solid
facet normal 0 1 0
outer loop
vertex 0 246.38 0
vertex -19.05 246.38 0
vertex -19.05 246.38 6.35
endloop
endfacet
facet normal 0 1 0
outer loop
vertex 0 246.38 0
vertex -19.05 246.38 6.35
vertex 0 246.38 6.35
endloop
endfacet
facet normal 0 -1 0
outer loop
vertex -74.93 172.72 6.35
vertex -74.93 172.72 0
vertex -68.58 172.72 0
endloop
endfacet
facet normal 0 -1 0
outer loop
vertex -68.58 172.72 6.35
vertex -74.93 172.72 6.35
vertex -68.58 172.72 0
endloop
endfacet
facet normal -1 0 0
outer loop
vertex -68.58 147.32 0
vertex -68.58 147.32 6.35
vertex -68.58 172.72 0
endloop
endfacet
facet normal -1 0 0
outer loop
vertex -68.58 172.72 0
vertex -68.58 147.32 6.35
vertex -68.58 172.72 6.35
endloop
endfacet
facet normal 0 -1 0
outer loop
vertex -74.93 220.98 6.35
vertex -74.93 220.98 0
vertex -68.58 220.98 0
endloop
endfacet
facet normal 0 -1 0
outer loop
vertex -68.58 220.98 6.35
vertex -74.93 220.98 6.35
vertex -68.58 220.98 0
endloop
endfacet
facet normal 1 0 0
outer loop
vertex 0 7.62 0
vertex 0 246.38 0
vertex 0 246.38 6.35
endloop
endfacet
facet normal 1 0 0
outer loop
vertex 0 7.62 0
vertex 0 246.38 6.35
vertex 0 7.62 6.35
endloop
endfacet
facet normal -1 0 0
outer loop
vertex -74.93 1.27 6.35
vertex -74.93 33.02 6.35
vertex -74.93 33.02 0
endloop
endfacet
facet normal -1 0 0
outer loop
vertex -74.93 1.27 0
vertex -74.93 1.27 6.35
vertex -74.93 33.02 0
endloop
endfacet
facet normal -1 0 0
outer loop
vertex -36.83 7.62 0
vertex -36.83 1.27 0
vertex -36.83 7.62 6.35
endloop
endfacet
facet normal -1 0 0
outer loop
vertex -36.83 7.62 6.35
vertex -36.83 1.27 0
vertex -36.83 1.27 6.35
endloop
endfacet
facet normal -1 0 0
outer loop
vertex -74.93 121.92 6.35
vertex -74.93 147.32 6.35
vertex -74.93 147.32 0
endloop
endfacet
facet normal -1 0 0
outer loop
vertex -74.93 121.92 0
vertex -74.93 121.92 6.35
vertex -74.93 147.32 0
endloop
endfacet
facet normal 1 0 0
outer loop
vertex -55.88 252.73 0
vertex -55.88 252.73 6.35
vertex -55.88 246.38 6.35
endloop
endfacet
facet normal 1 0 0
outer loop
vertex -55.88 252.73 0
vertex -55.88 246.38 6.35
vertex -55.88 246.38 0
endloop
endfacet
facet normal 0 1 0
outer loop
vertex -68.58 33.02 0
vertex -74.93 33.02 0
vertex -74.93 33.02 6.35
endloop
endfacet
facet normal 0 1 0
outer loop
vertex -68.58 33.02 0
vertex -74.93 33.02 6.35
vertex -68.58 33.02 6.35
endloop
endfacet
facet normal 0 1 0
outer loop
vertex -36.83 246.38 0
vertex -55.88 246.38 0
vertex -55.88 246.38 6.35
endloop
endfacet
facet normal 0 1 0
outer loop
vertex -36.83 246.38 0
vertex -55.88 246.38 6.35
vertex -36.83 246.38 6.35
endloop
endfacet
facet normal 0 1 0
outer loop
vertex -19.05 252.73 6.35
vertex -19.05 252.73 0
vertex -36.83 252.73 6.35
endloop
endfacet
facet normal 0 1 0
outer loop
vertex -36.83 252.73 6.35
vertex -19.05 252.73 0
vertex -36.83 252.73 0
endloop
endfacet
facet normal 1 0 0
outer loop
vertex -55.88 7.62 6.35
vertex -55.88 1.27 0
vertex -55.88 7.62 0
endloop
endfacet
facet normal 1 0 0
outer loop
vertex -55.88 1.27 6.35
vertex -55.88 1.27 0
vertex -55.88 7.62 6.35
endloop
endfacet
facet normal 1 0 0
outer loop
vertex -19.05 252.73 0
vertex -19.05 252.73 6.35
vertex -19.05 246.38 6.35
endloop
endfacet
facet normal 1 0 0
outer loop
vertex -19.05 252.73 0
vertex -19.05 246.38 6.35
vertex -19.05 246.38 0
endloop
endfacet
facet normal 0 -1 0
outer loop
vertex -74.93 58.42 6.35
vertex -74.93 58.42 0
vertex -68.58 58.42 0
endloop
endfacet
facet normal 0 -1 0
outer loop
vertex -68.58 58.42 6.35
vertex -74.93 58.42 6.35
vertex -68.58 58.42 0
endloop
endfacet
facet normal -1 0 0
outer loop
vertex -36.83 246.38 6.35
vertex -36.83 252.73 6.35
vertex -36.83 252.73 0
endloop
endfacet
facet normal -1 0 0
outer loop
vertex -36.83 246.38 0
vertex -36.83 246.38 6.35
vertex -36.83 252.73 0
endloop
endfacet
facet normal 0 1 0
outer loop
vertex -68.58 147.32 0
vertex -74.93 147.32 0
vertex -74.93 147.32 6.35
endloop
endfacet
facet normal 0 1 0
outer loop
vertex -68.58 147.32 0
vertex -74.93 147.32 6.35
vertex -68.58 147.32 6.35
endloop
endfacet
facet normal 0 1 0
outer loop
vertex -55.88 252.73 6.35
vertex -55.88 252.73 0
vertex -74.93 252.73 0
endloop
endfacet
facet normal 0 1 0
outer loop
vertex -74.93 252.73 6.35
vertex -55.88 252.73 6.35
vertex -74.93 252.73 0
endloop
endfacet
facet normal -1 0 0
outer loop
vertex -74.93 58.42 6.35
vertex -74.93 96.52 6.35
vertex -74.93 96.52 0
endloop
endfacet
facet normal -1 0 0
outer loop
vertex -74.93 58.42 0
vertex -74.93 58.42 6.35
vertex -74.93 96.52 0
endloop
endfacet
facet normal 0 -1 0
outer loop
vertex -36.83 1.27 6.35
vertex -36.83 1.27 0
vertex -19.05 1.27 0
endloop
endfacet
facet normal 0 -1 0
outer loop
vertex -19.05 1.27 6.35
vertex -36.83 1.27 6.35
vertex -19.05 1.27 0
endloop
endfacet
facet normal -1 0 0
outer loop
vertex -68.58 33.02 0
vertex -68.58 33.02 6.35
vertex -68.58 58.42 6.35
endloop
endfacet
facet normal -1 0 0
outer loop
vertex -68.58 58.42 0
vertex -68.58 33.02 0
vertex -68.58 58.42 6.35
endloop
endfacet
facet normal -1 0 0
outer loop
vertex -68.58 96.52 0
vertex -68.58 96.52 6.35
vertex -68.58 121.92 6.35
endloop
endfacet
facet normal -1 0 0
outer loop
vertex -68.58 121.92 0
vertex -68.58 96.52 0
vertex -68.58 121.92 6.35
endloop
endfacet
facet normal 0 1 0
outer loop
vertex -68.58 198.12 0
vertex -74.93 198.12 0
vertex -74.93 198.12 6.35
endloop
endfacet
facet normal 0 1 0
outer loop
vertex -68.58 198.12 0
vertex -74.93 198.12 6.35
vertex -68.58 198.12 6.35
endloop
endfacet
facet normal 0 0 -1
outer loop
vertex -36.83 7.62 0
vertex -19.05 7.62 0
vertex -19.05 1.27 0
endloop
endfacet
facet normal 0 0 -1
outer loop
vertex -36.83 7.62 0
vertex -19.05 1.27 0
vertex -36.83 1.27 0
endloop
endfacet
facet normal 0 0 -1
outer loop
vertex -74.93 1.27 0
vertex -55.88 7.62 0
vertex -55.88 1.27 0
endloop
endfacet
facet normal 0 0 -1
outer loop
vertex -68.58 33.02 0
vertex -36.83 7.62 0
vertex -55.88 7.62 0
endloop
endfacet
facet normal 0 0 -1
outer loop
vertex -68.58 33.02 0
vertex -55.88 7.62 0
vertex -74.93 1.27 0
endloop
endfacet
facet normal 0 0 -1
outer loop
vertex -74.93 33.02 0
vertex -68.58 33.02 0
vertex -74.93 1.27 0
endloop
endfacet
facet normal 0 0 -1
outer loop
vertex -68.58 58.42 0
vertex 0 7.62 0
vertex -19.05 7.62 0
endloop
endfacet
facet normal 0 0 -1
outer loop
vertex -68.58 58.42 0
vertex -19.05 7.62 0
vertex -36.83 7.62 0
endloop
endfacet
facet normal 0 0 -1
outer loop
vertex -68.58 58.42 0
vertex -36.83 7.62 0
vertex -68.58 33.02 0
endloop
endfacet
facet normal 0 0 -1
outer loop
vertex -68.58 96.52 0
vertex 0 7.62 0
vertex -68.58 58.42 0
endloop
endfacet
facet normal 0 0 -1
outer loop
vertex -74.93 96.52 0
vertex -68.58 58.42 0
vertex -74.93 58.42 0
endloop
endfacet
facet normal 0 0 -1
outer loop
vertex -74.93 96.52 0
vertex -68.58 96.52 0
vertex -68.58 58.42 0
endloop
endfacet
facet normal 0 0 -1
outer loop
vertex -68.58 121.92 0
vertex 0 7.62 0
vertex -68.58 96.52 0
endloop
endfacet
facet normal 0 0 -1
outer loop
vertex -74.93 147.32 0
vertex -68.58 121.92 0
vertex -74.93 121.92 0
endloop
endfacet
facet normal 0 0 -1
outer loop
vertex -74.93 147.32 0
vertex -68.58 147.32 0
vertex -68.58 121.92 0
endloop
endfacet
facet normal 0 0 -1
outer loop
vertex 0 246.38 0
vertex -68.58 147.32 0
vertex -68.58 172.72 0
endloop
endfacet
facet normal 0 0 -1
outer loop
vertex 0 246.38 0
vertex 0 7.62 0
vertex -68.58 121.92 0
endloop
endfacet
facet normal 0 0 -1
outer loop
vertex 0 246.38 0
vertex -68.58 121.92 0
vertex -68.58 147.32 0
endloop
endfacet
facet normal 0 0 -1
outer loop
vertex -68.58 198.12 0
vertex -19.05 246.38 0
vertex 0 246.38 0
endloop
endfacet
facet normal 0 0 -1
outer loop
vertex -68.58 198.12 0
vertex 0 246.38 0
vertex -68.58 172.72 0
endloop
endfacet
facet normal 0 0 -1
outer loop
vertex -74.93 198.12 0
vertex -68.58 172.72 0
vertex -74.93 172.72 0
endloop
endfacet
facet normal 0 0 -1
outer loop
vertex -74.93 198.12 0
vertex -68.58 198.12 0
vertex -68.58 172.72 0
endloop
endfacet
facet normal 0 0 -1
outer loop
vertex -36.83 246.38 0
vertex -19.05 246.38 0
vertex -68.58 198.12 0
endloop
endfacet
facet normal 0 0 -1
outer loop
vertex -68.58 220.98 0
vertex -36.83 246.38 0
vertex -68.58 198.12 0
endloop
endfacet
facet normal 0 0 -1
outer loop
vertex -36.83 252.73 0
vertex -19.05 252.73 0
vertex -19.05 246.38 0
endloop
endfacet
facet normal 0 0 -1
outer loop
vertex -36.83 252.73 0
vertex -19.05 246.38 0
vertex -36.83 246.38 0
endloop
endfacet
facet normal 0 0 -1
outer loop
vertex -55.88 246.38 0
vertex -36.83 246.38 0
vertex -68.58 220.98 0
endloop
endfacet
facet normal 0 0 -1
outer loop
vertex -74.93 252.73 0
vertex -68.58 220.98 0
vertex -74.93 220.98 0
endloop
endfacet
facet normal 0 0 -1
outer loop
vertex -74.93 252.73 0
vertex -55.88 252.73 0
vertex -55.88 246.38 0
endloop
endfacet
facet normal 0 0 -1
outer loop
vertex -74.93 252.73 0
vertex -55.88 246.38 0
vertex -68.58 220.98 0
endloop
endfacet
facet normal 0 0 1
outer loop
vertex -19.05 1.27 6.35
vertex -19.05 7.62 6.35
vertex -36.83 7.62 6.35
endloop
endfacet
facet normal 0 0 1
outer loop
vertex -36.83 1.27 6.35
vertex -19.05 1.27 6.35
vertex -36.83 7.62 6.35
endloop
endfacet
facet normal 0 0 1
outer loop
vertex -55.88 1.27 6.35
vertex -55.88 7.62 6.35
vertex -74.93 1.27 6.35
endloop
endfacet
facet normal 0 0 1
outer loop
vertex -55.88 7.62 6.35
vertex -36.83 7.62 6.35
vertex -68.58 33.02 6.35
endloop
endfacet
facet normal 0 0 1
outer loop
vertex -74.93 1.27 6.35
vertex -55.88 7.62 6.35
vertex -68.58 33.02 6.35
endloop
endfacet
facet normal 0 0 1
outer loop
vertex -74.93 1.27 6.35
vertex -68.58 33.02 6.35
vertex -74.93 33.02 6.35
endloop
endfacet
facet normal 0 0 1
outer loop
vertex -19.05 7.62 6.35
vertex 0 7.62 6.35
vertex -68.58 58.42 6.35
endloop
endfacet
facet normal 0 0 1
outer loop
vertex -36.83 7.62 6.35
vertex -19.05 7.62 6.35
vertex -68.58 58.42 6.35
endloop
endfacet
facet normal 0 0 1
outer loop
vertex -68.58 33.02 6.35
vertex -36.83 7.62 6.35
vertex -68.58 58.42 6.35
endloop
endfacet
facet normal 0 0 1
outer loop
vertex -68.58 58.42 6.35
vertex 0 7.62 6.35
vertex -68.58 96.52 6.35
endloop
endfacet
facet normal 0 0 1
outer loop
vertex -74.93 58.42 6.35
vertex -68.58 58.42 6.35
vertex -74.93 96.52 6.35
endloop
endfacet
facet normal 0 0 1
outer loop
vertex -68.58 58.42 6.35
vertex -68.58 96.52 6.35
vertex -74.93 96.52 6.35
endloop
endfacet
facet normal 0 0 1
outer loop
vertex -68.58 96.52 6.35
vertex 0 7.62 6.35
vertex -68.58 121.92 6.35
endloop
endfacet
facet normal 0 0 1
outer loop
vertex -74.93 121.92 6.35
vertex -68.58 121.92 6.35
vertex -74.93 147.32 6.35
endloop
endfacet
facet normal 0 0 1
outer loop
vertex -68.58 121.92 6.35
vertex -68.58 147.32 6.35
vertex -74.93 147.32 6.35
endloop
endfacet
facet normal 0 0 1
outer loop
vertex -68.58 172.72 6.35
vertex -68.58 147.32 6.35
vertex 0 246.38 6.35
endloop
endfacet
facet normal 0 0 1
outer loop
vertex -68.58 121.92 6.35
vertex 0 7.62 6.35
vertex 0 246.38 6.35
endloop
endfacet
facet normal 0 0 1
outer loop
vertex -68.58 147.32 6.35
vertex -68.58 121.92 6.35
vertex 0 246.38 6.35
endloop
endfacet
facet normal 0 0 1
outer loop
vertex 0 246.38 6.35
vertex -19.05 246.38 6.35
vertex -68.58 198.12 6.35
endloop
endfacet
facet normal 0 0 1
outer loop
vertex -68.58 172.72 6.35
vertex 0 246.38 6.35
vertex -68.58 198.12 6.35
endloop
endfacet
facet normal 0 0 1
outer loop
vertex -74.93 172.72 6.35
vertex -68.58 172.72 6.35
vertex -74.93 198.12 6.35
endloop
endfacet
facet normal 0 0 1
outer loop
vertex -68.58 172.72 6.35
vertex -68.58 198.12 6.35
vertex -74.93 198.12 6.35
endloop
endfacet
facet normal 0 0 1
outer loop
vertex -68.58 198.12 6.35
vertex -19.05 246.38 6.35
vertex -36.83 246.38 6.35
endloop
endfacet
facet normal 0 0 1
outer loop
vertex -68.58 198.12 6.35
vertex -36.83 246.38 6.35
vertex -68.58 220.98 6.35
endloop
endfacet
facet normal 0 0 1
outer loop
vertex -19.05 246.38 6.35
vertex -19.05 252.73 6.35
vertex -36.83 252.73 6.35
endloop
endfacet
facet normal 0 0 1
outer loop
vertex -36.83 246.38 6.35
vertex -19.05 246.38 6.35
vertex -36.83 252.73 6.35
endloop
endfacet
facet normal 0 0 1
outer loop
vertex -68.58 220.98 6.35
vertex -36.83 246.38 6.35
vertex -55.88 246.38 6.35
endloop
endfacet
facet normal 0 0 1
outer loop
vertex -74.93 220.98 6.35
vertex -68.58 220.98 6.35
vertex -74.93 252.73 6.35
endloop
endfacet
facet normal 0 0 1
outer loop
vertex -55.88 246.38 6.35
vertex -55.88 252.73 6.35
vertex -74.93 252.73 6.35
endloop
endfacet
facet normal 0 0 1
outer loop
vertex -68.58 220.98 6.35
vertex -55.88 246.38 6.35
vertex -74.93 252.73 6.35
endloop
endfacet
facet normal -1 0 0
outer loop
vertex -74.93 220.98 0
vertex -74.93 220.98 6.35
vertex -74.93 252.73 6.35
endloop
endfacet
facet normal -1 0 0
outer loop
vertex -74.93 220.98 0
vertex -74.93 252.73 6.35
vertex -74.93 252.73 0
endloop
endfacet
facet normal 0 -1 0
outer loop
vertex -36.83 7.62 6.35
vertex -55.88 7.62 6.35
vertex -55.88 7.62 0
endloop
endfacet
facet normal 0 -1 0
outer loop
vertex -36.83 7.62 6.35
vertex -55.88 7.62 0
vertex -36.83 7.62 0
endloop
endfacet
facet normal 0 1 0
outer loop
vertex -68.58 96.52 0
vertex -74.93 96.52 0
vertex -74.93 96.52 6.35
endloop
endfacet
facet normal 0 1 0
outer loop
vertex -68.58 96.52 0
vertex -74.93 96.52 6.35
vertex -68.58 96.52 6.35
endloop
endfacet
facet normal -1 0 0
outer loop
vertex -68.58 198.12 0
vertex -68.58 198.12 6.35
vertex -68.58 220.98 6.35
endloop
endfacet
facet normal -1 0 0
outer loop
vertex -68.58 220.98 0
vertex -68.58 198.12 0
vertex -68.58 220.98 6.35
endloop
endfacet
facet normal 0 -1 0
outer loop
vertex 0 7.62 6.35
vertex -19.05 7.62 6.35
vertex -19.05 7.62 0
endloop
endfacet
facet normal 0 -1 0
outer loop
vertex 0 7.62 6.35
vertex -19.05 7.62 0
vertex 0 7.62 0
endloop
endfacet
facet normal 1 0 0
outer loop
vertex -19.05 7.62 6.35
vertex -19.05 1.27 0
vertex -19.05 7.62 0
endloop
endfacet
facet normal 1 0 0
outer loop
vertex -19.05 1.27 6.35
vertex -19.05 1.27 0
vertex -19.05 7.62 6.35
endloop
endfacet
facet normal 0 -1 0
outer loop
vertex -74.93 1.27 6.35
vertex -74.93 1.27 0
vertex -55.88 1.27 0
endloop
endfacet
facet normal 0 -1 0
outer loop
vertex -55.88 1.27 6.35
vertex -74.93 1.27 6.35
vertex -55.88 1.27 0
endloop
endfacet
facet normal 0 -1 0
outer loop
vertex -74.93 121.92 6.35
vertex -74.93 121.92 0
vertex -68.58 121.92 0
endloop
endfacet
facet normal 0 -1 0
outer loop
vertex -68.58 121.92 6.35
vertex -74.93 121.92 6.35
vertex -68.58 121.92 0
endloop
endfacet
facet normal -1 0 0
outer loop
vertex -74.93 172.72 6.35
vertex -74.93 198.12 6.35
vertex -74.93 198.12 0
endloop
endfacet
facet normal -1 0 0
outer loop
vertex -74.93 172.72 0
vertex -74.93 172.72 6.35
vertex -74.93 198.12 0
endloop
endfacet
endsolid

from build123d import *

# Parameters (mm, degrees)
BOSS_EXTRUDE1_DEPTH = 6.35
SKETCH3_W           = 19.05
SKETCH3_H           = 6.35
CUT_EXTRUDE1_DEPTH  = 6.35
SKETCH4_W           = 1.27
SKETCH4_H           = 6.35
CUT_EXTRUDE2_DEPTH  = 252.46
SKETCH5_W           = 19.05
SKETCH5_H           = 6.35
CUT_EXTRUDE3_DEPTH  = 6.35
SKETCH6_W           = 6.35
SKETCH6_H           = 25.4
SKETCH6_H_2         = 22.86
CUT_EXTRUDE4_DEPTH  = 6.35


with BuildPart() as part:
    # Sketch1 → Boss-Extrude1 (new body)
    with BuildSketch(Plane.XY):
        Polygon((0, 1.27), (-69.85, 1.27), (-76.2, 1.27), (-76.2, 252.73), (-69.85, 252.73), (0, 252.73), align=None)
    extrude(amount=BOSS_EXTRUDE1_DEPTH)

    # Sketch3 → Cut-Extrude1 (cut)
    with BuildSketch(Plane(origin=(0, 252.73, 0), x_dir=(1, 0, 0), z_dir=(0, 1, 0))):
        with Locations((-46.355, -3.175)):
            Rectangle(SKETCH3_W, SKETCH3_H)
        with Locations((-9.525, -3.175)):
            Rectangle(SKETCH3_W, SKETCH3_H)
    extrude(amount=-CUT_EXTRUDE1_DEPTH, mode=Mode.SUBTRACT)

    # Sketch4 → Cut-Extrude2 (cut, through all)
    with BuildSketch(Plane(origin=(0, 252.73, 0), x_dir=(1, 0, 0), z_dir=(0, 1, 0))):
        with Locations((-75.565, -3.175)):
            Rectangle(SKETCH4_W, SKETCH4_H)
    extrude(amount=-CUT_EXTRUDE2_DEPTH, mode=Mode.SUBTRACT)

    # Sketch5 → Cut-Extrude3 (cut)
    with BuildSketch(Plane.XZ.offset(-1.27)):
        with Locations((-46.355, 3.175)):
            Rectangle(SKETCH5_W, SKETCH5_H)
        with Locations((-9.525, 3.175)):
            Rectangle(SKETCH5_W, SKETCH5_H)
    extrude(amount=-CUT_EXTRUDE3_DEPTH, mode=Mode.SUBTRACT)

    # Sketch6 → Cut-Extrude4 (cut)
    with BuildSketch(Plane.XY.offset(6.35)):
        with Locations((-71.755, 45.72)):
            Rectangle(SKETCH6_W, SKETCH6_H)
        with Locations((-71.755, 109.22)):
            Rectangle(SKETCH6_W, SKETCH6_H)
        with Locations((-71.755, 160.02)):
            Rectangle(SKETCH6_W, SKETCH6_H)
        with Locations((-71.755, 209.55)):
            Rectangle(SKETCH6_W, SKETCH6_H_2)
    extrude(amount=-CUT_EXTRUDE4_DEPTH, mode=Mode.SUBTRACT)


solid = part.part
